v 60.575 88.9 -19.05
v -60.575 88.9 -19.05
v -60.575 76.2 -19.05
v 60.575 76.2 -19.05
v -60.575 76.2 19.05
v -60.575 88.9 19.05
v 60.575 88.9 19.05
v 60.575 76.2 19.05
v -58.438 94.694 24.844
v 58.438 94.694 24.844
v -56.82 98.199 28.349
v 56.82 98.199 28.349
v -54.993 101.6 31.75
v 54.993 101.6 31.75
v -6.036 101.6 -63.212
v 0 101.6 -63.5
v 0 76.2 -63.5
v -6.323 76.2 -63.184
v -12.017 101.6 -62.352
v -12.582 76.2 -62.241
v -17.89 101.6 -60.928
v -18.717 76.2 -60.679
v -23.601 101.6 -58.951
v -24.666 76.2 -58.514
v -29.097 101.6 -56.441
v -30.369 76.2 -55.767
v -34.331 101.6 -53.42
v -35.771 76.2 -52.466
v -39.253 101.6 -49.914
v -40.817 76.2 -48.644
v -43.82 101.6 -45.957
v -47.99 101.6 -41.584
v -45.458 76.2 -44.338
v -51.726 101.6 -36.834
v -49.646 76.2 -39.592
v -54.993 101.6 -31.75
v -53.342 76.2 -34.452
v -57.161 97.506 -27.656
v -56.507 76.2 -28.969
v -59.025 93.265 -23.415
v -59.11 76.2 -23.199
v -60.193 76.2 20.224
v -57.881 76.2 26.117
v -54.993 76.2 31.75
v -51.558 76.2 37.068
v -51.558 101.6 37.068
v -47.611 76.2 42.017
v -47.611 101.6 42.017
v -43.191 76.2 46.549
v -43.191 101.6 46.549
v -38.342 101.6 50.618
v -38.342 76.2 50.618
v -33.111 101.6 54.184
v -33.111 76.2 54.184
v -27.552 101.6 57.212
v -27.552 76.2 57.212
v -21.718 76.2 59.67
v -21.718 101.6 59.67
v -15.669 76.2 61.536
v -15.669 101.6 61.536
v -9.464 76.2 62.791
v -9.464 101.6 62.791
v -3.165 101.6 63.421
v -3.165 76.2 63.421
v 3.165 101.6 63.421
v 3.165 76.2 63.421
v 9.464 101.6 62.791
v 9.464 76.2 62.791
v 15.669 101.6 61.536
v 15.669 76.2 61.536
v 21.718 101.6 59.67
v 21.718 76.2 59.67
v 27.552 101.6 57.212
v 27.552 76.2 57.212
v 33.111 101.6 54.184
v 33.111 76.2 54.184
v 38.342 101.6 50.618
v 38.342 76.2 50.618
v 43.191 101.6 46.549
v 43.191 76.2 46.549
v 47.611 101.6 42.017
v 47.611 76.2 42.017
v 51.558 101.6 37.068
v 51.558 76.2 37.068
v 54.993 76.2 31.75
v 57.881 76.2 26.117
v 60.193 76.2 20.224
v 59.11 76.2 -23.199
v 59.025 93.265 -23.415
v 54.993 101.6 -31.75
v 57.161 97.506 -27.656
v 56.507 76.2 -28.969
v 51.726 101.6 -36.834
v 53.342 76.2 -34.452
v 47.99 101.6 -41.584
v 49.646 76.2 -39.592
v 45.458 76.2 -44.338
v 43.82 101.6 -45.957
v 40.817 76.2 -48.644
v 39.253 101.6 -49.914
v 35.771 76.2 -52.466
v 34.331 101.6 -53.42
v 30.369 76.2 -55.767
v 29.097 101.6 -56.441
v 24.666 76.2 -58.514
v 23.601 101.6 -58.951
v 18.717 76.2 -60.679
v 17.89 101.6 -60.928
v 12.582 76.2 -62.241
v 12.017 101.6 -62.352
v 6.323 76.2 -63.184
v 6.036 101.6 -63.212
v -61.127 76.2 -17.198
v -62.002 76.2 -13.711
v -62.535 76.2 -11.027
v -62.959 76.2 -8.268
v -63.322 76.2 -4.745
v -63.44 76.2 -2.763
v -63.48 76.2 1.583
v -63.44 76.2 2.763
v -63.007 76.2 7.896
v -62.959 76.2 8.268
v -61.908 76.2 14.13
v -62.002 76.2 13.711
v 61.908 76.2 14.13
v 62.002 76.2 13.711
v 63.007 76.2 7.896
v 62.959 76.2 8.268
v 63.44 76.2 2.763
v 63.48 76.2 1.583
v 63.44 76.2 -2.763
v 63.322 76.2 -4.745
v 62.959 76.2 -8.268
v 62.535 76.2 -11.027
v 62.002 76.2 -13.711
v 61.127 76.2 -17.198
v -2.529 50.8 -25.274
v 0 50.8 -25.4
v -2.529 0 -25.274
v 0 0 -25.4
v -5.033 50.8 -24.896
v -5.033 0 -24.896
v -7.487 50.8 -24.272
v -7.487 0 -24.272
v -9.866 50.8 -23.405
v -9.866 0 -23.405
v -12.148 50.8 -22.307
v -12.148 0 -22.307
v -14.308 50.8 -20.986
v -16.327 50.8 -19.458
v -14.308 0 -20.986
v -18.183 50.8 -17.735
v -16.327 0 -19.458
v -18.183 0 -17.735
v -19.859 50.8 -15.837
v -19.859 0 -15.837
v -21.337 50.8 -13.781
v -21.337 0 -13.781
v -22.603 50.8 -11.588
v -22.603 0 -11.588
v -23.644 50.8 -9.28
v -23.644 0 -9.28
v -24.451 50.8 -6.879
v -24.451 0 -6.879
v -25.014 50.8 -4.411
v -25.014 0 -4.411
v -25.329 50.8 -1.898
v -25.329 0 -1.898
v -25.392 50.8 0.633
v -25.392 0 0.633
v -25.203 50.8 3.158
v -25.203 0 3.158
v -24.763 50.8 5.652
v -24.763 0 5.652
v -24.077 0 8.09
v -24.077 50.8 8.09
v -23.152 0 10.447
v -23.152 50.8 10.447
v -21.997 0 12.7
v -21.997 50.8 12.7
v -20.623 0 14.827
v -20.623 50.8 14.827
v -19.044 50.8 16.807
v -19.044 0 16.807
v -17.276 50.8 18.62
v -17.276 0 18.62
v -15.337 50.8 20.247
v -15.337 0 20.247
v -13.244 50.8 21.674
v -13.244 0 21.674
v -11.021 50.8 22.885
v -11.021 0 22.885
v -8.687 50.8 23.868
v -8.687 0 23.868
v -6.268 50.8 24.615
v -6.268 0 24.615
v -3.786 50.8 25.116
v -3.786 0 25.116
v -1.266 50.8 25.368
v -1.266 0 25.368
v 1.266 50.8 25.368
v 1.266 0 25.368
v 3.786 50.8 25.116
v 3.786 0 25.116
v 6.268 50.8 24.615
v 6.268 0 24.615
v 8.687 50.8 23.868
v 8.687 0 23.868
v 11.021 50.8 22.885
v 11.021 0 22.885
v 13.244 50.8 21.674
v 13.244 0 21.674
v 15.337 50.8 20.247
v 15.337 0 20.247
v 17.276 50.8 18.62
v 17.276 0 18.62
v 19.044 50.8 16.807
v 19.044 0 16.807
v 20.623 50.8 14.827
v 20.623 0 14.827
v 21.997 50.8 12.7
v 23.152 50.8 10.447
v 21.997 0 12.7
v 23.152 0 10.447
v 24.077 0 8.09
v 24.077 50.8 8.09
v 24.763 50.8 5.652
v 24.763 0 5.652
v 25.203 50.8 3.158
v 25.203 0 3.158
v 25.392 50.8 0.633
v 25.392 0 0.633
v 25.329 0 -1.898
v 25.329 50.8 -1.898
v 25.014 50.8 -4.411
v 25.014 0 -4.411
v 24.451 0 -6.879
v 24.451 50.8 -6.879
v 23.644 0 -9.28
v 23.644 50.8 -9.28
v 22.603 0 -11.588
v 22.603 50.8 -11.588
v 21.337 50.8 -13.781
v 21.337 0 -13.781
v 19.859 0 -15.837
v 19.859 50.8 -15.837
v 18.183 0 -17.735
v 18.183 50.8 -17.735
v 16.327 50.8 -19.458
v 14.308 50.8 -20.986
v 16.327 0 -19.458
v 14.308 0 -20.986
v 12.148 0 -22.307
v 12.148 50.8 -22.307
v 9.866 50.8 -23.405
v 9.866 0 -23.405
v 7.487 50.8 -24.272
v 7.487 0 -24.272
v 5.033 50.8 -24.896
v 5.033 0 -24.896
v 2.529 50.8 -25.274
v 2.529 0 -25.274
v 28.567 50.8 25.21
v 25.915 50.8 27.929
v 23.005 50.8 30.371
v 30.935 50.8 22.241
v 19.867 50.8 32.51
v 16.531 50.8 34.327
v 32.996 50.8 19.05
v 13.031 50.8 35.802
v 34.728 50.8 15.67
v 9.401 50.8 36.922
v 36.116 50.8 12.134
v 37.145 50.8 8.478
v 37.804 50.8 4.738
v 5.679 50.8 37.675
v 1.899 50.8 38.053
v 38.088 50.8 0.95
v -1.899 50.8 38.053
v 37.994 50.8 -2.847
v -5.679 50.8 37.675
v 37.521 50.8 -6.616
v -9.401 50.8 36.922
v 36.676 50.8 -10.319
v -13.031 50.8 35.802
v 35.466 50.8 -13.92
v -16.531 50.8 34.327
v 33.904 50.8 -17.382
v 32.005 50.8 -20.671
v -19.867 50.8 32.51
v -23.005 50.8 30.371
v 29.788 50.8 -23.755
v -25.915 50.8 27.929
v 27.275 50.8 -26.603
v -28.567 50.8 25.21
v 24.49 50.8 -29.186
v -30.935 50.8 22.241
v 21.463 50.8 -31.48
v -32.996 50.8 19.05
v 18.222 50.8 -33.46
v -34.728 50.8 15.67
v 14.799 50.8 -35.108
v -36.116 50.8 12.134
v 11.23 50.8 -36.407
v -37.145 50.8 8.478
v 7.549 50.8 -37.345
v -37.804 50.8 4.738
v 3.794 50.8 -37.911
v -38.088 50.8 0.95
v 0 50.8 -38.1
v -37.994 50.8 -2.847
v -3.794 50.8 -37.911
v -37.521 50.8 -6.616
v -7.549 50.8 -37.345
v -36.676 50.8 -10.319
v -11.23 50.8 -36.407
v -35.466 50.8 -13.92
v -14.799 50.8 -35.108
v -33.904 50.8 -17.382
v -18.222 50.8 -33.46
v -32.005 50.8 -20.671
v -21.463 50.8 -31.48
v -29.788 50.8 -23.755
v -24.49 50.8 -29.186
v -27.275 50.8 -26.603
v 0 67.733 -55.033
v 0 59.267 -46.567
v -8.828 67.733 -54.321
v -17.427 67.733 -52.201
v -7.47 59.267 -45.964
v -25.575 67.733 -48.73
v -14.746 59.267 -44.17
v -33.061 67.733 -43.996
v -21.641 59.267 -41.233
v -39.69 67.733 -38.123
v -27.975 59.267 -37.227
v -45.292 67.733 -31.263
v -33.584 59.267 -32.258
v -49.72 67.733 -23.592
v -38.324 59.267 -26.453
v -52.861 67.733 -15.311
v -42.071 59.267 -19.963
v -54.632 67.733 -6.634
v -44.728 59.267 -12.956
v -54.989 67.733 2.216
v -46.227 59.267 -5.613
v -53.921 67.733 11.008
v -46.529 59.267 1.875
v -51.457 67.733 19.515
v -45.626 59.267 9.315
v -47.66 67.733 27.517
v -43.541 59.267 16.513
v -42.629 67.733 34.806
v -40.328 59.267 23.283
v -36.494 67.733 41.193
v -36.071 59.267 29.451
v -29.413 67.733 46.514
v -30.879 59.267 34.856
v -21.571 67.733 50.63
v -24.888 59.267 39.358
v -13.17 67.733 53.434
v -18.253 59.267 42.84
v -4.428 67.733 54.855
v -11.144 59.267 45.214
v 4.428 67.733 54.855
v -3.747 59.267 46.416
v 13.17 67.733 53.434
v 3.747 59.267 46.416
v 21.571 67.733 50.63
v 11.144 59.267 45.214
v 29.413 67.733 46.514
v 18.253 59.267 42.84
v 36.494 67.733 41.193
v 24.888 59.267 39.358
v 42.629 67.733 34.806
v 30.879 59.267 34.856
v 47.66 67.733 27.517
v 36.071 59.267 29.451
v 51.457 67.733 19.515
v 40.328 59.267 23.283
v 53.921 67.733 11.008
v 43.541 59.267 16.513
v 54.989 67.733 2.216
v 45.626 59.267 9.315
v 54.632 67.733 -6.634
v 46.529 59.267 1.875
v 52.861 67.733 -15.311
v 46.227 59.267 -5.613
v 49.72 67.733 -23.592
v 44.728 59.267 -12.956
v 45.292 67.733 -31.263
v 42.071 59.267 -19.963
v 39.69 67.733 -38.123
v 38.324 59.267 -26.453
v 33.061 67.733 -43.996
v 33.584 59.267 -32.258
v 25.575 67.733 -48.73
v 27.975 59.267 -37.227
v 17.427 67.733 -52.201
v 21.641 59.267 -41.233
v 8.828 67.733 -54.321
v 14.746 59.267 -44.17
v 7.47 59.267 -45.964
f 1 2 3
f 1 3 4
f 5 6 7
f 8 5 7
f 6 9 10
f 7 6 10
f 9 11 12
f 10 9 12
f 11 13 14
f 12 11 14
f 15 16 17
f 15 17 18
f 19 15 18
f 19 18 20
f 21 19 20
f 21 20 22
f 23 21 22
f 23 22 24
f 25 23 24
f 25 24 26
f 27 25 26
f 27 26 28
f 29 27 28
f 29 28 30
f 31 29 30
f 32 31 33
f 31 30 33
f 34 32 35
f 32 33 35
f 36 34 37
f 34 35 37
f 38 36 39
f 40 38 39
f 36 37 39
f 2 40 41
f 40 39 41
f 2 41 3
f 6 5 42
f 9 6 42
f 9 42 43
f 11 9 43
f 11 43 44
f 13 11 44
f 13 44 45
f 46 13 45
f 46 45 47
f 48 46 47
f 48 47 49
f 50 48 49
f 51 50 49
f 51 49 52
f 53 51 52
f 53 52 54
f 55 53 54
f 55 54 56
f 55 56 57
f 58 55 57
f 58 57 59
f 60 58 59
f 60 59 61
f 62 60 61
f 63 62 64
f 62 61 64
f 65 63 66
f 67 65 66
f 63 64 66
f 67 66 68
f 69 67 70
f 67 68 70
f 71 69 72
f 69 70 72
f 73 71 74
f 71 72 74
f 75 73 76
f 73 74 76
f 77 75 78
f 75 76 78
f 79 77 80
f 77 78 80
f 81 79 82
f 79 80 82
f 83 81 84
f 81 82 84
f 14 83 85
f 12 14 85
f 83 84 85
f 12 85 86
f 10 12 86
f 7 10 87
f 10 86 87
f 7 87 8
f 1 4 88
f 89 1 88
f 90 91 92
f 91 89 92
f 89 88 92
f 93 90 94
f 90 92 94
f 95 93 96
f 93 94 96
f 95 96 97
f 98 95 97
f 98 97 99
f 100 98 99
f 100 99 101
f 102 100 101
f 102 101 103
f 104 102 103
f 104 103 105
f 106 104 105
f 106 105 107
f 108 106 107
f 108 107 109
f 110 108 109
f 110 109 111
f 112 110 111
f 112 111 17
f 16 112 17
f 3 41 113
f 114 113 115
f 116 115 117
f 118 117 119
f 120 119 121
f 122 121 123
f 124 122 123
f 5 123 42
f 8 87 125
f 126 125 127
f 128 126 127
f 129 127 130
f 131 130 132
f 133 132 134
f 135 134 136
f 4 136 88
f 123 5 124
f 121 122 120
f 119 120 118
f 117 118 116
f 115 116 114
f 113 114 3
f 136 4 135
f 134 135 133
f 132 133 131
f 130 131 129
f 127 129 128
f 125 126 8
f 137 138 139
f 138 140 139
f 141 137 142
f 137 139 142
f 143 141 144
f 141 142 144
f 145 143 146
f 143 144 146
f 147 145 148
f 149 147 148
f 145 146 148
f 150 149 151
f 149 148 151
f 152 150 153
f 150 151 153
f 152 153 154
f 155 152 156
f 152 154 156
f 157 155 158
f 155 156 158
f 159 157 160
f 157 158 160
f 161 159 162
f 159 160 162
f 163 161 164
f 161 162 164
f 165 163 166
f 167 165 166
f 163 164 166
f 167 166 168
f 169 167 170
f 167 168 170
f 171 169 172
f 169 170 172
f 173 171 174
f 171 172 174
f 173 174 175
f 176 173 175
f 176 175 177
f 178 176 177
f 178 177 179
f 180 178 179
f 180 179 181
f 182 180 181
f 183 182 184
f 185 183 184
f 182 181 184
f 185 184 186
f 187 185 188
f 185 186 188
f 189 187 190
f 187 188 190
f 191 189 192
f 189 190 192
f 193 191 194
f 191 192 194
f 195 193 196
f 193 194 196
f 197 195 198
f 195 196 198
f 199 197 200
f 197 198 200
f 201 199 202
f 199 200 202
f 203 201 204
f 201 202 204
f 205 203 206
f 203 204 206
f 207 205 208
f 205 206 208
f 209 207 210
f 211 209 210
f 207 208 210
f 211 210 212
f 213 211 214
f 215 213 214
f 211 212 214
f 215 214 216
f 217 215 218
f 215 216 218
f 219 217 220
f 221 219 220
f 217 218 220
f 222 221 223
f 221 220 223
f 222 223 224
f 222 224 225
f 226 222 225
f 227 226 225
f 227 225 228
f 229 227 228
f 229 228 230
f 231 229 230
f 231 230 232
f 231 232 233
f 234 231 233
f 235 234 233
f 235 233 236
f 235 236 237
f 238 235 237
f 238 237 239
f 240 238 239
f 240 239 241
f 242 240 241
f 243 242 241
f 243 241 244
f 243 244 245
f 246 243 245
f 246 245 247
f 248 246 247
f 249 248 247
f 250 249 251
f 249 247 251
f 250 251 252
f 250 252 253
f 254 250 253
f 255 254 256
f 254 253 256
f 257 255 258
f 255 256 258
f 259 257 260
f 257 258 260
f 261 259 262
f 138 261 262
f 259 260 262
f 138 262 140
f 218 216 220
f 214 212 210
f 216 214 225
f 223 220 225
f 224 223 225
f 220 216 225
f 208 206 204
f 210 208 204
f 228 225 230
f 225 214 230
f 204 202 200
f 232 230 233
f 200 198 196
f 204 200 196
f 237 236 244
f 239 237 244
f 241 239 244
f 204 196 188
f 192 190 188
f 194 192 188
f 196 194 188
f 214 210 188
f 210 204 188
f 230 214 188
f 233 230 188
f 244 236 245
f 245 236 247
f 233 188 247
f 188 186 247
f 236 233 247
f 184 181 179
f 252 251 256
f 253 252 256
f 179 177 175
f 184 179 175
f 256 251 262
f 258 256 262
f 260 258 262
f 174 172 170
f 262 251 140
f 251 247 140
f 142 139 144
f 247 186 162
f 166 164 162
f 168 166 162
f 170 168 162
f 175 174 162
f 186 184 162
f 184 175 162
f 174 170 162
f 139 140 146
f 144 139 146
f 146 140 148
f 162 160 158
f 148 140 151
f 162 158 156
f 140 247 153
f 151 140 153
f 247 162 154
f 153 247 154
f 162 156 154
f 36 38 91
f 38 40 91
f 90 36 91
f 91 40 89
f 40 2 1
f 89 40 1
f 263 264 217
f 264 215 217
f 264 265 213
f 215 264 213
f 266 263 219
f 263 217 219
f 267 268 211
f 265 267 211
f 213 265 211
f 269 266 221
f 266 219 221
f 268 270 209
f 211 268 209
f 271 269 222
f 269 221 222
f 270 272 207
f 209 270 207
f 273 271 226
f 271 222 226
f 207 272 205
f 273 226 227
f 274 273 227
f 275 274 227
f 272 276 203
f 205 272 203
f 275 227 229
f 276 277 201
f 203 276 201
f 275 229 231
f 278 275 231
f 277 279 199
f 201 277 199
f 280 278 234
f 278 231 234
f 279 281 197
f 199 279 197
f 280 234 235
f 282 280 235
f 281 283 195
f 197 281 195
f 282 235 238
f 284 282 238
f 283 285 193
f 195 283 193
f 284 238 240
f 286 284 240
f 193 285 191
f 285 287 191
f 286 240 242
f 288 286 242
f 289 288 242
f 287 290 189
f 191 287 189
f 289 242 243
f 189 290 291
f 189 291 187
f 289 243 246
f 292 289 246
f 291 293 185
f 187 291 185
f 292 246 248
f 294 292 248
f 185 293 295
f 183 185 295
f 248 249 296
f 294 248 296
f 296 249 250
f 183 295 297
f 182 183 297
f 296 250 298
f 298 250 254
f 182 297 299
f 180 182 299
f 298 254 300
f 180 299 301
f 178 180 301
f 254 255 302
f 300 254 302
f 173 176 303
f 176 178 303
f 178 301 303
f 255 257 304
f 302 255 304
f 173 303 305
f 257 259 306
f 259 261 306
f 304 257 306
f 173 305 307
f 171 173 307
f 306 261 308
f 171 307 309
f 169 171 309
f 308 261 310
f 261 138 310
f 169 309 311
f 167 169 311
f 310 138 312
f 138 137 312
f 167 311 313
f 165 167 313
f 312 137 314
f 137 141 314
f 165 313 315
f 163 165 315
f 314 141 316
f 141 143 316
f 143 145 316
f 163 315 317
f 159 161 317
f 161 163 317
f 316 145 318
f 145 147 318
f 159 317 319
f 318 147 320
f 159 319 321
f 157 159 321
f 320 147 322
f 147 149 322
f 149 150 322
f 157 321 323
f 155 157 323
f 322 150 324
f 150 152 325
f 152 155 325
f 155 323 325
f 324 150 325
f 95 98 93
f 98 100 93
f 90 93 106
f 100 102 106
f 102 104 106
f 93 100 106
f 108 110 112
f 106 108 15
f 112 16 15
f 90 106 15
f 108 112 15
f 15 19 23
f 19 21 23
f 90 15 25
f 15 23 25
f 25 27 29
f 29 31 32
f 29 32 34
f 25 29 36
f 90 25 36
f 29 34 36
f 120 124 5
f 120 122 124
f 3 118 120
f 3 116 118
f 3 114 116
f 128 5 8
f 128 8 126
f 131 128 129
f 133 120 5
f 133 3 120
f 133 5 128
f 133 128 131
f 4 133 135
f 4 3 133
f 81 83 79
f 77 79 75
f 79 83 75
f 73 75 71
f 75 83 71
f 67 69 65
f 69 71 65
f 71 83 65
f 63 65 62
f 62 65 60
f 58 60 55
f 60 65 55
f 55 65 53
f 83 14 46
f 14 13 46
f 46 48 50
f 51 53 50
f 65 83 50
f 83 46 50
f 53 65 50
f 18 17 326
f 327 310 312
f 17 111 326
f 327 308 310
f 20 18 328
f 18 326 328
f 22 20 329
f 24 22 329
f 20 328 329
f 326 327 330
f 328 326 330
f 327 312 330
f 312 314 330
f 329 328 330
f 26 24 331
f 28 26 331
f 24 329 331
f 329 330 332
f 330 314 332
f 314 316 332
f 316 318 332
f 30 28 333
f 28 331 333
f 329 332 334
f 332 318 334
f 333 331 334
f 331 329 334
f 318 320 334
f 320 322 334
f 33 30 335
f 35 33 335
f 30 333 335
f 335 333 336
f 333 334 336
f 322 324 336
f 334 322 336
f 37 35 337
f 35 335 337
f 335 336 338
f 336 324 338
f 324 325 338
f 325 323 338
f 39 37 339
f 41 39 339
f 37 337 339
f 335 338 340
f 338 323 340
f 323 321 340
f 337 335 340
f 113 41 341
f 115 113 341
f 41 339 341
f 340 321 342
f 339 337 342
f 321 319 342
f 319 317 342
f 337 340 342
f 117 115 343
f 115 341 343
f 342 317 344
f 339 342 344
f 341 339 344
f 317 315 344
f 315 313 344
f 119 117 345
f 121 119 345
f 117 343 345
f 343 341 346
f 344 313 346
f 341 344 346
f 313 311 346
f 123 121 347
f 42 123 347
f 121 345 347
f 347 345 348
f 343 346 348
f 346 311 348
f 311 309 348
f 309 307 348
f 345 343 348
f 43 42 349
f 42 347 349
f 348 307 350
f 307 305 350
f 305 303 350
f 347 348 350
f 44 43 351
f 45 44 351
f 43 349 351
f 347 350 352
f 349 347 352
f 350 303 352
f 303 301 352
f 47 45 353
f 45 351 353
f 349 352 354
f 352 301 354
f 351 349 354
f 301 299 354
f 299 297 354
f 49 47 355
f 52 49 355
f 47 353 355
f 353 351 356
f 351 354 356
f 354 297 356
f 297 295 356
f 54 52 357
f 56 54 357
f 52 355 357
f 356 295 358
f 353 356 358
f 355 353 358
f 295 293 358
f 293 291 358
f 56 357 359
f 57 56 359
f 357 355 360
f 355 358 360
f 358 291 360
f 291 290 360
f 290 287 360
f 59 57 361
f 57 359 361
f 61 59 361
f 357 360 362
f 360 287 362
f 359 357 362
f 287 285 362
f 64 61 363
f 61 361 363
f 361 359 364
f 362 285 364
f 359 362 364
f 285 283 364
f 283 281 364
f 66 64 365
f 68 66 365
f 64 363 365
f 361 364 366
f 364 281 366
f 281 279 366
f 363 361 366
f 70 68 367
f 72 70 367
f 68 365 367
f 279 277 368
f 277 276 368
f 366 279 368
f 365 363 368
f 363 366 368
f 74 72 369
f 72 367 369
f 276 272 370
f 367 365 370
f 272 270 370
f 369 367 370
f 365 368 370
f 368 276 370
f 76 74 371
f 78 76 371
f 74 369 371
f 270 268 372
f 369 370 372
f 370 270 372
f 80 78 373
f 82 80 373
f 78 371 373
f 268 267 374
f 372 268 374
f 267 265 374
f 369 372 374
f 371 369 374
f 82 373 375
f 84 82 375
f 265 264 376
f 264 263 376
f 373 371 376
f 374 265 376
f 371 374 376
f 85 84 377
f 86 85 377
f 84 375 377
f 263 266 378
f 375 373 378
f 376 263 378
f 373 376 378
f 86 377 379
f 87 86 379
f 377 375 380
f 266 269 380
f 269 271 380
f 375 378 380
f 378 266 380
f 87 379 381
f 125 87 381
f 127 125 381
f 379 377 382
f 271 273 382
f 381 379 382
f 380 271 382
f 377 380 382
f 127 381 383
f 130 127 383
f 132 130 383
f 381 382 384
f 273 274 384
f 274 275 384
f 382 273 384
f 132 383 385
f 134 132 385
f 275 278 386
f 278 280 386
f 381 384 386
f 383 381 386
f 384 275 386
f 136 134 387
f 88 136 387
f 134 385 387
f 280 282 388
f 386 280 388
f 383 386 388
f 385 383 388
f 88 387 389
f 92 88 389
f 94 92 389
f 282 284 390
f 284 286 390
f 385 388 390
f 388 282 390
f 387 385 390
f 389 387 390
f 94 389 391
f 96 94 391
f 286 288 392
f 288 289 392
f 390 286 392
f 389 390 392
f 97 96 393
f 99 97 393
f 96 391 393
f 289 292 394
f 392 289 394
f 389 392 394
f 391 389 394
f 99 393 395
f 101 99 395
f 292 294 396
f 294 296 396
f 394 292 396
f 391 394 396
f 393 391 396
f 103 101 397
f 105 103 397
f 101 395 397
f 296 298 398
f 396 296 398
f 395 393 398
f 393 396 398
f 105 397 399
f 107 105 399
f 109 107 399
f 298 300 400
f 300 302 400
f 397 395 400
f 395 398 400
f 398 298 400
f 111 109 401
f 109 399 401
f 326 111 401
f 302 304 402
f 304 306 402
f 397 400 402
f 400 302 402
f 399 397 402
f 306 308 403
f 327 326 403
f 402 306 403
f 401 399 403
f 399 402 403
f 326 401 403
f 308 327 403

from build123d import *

# Parameters (mm, degrees)
SKETCH2_W          = 177.8
SKETCH2_H          = 38.1
CUT_EXTRUDE1_DEPTH = 25.4
CHAMFER1_SIZE      = 12.7
CHAMFER2_SIZE      = 25.4


with BuildPart() as part:
    # Sketch1 → Revolve1 (revolve)
    with BuildSketch(Plane.XY, mode=Mode.PRIVATE) as revolve1_sk:
        Polygon((0, 0), (0, 101.6), (63.5, 101.6), (63.5, 50.8), (25.4, 50.8), (25.4, 0), align=None)
    revolve(revolve1_sk.sketch.rotate(Axis((0, 0, 0), (0, 1, 0)), 90), axis=Axis((0, 0, 0), (0, 1, 0)))

    # Sketch2 → Cut-Extrude1 (cut)
    with BuildSketch(Plane(origin=(0, 101.6, 0), x_dir=(1, 0, 0), z_dir=(0, 1, 0))):
        Rectangle(SKETCH2_W, SKETCH2_H)
    extrude(amount=-CUT_EXTRUDE1_DEPTH, mode=Mode.SUBTRACT)

    # Chamfer1
    chamfer1_edges = [part.edges().sort_by_distance(p)[0] for p in [
        (0, 101.6, 19.05),
        (0, 101.6, -19.05),
    ]]
    chamfer(chamfer1_edges, length=CHAMFER1_SIZE)

    # Chamfer2
    chamfer2_edges = [part.edges().sort_by_distance(p)[0] for p in [
        (0, 50.8, 63.5),
    ]]
    chamfer(chamfer2_edges, length=CHAMFER2_SIZE - 0.0001)  # a hair under: the kernel refuses the full size


solid = part.part
